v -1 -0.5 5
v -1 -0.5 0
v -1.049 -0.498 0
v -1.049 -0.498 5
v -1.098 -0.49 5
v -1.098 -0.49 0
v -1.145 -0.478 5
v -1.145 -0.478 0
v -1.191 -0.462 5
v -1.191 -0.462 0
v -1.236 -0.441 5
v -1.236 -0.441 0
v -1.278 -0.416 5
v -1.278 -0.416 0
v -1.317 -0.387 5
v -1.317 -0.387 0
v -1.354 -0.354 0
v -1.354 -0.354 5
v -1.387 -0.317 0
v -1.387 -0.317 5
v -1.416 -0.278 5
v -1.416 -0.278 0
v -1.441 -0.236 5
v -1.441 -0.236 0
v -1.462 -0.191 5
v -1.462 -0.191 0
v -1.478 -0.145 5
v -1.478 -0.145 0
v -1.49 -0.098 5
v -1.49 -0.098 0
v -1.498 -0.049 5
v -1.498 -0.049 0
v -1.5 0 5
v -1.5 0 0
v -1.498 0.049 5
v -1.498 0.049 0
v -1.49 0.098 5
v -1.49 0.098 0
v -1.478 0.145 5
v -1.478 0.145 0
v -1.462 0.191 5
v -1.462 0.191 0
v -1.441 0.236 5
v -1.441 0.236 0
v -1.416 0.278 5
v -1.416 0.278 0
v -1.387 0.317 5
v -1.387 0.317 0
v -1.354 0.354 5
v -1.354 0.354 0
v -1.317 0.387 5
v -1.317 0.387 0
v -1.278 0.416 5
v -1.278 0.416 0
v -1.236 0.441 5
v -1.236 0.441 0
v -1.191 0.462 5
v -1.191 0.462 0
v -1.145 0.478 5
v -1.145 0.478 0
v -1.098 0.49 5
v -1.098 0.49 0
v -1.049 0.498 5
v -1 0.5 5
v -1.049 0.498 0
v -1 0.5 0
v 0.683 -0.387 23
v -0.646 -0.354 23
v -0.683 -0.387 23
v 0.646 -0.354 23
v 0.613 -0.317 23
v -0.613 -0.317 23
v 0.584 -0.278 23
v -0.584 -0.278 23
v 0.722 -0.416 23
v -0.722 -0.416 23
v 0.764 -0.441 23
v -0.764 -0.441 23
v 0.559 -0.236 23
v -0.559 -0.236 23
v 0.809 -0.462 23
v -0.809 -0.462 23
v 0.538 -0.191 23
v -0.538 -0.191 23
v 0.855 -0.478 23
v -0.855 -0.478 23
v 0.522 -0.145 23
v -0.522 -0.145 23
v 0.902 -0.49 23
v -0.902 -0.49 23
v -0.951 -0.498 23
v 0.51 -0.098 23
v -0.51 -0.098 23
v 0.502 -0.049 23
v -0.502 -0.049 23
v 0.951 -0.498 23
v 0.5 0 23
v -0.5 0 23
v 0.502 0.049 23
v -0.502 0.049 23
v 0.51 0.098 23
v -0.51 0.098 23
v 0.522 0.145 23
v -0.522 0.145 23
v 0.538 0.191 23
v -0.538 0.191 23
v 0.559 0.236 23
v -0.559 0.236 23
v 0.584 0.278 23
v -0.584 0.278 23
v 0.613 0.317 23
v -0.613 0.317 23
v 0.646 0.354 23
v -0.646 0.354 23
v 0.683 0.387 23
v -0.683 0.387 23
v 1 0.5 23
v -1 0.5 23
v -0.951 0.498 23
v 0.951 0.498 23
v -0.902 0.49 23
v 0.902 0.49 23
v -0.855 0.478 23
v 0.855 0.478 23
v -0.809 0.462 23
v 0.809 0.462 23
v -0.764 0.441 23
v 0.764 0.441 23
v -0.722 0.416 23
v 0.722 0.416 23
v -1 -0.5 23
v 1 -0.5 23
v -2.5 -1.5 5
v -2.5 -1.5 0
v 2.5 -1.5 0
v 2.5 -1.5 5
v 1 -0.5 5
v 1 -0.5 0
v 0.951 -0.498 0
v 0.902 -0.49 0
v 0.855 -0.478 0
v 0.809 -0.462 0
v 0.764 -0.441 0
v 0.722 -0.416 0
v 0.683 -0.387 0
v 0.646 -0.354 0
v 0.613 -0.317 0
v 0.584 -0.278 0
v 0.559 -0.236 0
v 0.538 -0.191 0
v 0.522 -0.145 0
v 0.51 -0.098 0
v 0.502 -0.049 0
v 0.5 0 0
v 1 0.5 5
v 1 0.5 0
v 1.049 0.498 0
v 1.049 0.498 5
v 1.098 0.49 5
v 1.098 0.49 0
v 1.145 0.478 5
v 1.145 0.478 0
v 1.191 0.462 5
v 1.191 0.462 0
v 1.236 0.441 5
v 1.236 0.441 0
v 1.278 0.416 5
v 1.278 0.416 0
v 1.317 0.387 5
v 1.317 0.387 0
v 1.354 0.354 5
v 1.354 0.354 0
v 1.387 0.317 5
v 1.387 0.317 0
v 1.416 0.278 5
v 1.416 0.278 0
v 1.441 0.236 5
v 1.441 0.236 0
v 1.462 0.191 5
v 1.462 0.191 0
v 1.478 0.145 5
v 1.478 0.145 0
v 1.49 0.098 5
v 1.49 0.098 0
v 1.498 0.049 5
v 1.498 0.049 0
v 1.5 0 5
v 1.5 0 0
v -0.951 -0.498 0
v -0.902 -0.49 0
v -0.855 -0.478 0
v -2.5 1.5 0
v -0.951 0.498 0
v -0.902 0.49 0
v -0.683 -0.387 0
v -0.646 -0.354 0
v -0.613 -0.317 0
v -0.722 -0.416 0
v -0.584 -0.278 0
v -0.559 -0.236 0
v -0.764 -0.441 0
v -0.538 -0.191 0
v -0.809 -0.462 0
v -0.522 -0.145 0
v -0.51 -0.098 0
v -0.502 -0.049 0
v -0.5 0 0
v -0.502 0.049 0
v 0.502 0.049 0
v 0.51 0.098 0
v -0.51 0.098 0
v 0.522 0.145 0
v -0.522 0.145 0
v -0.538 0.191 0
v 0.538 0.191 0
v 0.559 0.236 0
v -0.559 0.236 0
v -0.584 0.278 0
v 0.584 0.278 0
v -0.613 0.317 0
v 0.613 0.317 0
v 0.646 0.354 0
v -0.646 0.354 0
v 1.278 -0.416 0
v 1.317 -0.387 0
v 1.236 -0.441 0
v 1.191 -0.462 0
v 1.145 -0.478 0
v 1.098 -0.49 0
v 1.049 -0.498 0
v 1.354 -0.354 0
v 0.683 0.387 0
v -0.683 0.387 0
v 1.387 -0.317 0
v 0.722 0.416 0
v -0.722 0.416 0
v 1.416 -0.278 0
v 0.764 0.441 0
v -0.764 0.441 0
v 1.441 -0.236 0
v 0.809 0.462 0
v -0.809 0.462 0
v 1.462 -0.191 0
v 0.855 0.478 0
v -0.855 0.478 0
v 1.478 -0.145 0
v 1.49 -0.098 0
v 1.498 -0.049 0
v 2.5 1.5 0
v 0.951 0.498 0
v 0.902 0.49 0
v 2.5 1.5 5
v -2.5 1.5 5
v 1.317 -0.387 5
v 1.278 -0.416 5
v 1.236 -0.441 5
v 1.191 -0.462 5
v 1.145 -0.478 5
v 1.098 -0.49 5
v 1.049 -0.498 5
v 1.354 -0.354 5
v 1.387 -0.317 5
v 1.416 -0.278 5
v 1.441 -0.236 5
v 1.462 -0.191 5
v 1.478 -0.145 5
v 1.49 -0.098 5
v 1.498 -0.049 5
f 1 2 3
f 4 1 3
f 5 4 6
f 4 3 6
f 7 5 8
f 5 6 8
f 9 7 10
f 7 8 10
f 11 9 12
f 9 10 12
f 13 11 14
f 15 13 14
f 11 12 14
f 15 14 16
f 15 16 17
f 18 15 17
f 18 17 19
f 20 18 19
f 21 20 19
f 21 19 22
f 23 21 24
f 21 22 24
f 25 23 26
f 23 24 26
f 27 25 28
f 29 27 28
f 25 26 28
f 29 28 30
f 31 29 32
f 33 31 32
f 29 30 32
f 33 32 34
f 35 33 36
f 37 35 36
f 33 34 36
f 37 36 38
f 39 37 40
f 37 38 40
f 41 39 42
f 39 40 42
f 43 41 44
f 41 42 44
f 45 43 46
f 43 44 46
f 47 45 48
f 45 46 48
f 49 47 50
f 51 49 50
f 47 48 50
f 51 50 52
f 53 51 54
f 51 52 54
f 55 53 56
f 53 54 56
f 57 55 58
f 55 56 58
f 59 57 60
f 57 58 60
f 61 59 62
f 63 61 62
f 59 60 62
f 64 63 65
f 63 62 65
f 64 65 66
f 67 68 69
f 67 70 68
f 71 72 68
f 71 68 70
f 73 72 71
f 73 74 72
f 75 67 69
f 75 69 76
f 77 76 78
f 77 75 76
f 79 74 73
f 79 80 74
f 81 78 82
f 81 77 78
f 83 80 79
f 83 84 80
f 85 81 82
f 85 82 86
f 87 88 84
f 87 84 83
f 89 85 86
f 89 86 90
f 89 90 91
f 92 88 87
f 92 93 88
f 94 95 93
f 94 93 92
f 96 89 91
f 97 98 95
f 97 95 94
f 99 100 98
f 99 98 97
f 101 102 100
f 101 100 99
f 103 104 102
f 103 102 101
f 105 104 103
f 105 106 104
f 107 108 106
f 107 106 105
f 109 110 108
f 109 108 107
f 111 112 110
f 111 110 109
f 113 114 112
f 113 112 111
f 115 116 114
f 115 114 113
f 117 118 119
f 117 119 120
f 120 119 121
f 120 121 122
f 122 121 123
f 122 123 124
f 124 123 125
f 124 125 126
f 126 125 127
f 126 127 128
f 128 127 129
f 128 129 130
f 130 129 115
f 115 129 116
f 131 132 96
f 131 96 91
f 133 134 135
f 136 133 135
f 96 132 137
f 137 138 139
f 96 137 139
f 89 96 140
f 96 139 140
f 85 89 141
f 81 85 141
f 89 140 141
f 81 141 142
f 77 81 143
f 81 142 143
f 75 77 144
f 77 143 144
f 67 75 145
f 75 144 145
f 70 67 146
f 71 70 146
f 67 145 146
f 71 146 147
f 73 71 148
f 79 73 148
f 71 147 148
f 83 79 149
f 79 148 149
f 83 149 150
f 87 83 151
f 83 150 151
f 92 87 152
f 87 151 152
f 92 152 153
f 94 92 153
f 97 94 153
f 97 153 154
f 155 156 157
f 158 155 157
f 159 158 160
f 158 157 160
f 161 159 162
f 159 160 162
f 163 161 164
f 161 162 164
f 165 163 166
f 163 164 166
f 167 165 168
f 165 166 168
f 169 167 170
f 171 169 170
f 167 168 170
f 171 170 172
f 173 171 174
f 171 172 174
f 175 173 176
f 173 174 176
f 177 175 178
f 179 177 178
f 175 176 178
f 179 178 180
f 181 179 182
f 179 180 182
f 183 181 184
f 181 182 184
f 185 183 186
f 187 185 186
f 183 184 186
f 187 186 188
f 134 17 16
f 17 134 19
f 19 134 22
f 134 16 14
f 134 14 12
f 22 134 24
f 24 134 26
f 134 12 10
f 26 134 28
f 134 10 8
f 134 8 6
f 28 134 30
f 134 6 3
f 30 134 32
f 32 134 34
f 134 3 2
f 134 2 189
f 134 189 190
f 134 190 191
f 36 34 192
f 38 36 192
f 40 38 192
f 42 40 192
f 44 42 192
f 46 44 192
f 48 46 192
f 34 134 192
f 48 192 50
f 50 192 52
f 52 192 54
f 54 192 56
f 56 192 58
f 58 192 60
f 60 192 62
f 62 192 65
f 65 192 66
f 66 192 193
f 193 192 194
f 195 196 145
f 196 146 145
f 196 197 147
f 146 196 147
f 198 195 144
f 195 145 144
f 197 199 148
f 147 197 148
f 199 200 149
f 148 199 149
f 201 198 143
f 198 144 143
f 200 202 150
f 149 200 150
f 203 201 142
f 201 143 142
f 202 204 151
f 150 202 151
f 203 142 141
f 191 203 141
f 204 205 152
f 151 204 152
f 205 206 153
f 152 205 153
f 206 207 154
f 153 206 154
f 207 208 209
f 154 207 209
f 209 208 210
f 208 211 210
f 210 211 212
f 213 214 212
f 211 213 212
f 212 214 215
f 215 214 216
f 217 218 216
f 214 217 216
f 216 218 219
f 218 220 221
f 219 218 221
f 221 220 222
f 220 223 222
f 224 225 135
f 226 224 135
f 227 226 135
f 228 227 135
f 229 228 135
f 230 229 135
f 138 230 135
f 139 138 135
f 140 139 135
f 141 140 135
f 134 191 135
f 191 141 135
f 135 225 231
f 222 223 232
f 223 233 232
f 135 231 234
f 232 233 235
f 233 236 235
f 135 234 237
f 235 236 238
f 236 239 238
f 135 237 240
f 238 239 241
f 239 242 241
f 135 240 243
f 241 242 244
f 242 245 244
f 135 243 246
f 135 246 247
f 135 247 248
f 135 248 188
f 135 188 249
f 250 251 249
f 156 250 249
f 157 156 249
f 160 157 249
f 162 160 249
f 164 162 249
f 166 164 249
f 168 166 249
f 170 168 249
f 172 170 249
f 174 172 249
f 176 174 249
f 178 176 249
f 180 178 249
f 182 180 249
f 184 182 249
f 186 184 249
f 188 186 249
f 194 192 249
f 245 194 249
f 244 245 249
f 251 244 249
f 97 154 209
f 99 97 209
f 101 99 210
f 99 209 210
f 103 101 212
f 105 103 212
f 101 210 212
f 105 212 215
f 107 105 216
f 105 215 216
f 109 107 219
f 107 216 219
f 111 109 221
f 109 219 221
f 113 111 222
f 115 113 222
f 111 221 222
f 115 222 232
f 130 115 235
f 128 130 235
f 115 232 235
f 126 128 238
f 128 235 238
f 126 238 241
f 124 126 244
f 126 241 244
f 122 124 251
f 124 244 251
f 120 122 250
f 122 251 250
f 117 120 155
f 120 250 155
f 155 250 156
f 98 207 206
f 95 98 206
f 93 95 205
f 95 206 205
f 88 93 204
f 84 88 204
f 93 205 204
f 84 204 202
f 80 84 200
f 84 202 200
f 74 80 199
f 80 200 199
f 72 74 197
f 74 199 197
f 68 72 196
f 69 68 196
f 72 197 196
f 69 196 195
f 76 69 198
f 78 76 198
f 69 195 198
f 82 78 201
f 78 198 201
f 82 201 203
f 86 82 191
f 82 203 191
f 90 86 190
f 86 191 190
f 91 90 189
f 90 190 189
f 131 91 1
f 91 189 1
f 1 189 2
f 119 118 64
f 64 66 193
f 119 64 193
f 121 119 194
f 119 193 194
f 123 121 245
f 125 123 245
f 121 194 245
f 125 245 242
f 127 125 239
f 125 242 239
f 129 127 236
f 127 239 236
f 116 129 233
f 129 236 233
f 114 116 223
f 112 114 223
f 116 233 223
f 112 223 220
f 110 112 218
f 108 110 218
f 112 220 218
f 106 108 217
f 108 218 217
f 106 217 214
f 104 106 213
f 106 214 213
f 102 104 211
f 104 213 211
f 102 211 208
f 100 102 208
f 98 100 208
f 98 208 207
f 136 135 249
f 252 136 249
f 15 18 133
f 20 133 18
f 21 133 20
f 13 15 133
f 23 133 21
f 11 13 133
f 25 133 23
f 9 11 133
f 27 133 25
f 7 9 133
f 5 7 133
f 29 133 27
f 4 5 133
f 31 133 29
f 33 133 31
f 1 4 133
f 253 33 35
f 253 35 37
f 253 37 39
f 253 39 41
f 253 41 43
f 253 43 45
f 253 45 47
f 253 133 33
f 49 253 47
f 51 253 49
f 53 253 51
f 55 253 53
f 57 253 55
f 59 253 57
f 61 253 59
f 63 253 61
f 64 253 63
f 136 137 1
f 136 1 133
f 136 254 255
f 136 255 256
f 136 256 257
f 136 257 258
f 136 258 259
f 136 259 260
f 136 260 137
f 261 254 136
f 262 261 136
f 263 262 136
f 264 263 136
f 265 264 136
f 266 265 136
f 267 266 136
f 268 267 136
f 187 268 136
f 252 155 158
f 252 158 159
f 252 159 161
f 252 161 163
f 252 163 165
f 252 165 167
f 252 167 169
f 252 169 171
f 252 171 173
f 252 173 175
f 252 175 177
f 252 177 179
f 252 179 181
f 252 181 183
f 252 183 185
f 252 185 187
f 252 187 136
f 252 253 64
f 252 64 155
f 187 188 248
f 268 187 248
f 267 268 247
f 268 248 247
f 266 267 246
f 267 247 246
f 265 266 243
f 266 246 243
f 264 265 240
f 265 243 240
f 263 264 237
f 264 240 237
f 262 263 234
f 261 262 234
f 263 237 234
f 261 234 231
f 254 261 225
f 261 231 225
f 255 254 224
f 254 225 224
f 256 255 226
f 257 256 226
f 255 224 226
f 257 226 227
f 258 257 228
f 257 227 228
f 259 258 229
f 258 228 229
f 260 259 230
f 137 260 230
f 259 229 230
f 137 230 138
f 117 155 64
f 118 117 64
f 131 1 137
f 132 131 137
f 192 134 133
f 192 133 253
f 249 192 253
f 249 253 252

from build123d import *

# Parameters (mm, degrees)
F0_W     = 5
F0_H     = 3
F1_DEPTH = 5
F2_DEPTH = 23


with BuildPart() as f1:
    # F0 (on Top) → F1 (new body)
    with BuildSketch(Plane.XY):
        Rectangle(F0_W, F0_H)
        with BuildLine():
            Line((-1, 0.5), (1, 0.5))
            ThreePointArc((1, 0.5), (1.353553, 0.353553), (1.5, 0))
            ThreePointArc((1.5, 0), (1.353553, -0.353553), (1, -0.5))
            Line((1, -0.5), (-1, -0.5))
            ThreePointArc((-1, -0.5), (-1.5, 0), (-1, 0.5))
        make_face(mode=Mode.SUBTRACT)
        with BuildLine():
            ThreePointArc((1, -0.5), (0.646447, -0.353553), (0.5, 0))
            ThreePointArc((0.5, 0), (0.646447, 0.353553), (1, 0.5))
            Line((1, 0.5), (-1, 0.5))
            ThreePointArc((-1, 0.5), (-0.646447, 0.353553), (-0.5, 0))
            ThreePointArc((-0.5, 0), (-0.646447, -0.353553), (-1, -0.5))
            Line((-1, -0.5), (1, -0.5))
        make_face()
    extrude(amount=F1_DEPTH)

    # F0 (on Top) → F2 (join)
    with BuildSketch(Plane.XY):
        with BuildLine():
            ThreePointArc((1, -0.5), (0.646447, -0.353553), (0.5, 0))
            ThreePointArc((0.5, 0), (0.646447, 0.353553), (1, 0.5))
            Line((1, 0.5), (-1, 0.5))
            ThreePointArc((-1, 0.5), (-0.646447, 0.353553), (-0.5, 0))
            ThreePointArc((-0.5, 0), (-0.646447, -0.353553), (-1, -0.5))
            Line((-1, -0.5), (1, -0.5))
        make_face()
    extrude(amount=F2_DEPTH)


solid = f1.part
